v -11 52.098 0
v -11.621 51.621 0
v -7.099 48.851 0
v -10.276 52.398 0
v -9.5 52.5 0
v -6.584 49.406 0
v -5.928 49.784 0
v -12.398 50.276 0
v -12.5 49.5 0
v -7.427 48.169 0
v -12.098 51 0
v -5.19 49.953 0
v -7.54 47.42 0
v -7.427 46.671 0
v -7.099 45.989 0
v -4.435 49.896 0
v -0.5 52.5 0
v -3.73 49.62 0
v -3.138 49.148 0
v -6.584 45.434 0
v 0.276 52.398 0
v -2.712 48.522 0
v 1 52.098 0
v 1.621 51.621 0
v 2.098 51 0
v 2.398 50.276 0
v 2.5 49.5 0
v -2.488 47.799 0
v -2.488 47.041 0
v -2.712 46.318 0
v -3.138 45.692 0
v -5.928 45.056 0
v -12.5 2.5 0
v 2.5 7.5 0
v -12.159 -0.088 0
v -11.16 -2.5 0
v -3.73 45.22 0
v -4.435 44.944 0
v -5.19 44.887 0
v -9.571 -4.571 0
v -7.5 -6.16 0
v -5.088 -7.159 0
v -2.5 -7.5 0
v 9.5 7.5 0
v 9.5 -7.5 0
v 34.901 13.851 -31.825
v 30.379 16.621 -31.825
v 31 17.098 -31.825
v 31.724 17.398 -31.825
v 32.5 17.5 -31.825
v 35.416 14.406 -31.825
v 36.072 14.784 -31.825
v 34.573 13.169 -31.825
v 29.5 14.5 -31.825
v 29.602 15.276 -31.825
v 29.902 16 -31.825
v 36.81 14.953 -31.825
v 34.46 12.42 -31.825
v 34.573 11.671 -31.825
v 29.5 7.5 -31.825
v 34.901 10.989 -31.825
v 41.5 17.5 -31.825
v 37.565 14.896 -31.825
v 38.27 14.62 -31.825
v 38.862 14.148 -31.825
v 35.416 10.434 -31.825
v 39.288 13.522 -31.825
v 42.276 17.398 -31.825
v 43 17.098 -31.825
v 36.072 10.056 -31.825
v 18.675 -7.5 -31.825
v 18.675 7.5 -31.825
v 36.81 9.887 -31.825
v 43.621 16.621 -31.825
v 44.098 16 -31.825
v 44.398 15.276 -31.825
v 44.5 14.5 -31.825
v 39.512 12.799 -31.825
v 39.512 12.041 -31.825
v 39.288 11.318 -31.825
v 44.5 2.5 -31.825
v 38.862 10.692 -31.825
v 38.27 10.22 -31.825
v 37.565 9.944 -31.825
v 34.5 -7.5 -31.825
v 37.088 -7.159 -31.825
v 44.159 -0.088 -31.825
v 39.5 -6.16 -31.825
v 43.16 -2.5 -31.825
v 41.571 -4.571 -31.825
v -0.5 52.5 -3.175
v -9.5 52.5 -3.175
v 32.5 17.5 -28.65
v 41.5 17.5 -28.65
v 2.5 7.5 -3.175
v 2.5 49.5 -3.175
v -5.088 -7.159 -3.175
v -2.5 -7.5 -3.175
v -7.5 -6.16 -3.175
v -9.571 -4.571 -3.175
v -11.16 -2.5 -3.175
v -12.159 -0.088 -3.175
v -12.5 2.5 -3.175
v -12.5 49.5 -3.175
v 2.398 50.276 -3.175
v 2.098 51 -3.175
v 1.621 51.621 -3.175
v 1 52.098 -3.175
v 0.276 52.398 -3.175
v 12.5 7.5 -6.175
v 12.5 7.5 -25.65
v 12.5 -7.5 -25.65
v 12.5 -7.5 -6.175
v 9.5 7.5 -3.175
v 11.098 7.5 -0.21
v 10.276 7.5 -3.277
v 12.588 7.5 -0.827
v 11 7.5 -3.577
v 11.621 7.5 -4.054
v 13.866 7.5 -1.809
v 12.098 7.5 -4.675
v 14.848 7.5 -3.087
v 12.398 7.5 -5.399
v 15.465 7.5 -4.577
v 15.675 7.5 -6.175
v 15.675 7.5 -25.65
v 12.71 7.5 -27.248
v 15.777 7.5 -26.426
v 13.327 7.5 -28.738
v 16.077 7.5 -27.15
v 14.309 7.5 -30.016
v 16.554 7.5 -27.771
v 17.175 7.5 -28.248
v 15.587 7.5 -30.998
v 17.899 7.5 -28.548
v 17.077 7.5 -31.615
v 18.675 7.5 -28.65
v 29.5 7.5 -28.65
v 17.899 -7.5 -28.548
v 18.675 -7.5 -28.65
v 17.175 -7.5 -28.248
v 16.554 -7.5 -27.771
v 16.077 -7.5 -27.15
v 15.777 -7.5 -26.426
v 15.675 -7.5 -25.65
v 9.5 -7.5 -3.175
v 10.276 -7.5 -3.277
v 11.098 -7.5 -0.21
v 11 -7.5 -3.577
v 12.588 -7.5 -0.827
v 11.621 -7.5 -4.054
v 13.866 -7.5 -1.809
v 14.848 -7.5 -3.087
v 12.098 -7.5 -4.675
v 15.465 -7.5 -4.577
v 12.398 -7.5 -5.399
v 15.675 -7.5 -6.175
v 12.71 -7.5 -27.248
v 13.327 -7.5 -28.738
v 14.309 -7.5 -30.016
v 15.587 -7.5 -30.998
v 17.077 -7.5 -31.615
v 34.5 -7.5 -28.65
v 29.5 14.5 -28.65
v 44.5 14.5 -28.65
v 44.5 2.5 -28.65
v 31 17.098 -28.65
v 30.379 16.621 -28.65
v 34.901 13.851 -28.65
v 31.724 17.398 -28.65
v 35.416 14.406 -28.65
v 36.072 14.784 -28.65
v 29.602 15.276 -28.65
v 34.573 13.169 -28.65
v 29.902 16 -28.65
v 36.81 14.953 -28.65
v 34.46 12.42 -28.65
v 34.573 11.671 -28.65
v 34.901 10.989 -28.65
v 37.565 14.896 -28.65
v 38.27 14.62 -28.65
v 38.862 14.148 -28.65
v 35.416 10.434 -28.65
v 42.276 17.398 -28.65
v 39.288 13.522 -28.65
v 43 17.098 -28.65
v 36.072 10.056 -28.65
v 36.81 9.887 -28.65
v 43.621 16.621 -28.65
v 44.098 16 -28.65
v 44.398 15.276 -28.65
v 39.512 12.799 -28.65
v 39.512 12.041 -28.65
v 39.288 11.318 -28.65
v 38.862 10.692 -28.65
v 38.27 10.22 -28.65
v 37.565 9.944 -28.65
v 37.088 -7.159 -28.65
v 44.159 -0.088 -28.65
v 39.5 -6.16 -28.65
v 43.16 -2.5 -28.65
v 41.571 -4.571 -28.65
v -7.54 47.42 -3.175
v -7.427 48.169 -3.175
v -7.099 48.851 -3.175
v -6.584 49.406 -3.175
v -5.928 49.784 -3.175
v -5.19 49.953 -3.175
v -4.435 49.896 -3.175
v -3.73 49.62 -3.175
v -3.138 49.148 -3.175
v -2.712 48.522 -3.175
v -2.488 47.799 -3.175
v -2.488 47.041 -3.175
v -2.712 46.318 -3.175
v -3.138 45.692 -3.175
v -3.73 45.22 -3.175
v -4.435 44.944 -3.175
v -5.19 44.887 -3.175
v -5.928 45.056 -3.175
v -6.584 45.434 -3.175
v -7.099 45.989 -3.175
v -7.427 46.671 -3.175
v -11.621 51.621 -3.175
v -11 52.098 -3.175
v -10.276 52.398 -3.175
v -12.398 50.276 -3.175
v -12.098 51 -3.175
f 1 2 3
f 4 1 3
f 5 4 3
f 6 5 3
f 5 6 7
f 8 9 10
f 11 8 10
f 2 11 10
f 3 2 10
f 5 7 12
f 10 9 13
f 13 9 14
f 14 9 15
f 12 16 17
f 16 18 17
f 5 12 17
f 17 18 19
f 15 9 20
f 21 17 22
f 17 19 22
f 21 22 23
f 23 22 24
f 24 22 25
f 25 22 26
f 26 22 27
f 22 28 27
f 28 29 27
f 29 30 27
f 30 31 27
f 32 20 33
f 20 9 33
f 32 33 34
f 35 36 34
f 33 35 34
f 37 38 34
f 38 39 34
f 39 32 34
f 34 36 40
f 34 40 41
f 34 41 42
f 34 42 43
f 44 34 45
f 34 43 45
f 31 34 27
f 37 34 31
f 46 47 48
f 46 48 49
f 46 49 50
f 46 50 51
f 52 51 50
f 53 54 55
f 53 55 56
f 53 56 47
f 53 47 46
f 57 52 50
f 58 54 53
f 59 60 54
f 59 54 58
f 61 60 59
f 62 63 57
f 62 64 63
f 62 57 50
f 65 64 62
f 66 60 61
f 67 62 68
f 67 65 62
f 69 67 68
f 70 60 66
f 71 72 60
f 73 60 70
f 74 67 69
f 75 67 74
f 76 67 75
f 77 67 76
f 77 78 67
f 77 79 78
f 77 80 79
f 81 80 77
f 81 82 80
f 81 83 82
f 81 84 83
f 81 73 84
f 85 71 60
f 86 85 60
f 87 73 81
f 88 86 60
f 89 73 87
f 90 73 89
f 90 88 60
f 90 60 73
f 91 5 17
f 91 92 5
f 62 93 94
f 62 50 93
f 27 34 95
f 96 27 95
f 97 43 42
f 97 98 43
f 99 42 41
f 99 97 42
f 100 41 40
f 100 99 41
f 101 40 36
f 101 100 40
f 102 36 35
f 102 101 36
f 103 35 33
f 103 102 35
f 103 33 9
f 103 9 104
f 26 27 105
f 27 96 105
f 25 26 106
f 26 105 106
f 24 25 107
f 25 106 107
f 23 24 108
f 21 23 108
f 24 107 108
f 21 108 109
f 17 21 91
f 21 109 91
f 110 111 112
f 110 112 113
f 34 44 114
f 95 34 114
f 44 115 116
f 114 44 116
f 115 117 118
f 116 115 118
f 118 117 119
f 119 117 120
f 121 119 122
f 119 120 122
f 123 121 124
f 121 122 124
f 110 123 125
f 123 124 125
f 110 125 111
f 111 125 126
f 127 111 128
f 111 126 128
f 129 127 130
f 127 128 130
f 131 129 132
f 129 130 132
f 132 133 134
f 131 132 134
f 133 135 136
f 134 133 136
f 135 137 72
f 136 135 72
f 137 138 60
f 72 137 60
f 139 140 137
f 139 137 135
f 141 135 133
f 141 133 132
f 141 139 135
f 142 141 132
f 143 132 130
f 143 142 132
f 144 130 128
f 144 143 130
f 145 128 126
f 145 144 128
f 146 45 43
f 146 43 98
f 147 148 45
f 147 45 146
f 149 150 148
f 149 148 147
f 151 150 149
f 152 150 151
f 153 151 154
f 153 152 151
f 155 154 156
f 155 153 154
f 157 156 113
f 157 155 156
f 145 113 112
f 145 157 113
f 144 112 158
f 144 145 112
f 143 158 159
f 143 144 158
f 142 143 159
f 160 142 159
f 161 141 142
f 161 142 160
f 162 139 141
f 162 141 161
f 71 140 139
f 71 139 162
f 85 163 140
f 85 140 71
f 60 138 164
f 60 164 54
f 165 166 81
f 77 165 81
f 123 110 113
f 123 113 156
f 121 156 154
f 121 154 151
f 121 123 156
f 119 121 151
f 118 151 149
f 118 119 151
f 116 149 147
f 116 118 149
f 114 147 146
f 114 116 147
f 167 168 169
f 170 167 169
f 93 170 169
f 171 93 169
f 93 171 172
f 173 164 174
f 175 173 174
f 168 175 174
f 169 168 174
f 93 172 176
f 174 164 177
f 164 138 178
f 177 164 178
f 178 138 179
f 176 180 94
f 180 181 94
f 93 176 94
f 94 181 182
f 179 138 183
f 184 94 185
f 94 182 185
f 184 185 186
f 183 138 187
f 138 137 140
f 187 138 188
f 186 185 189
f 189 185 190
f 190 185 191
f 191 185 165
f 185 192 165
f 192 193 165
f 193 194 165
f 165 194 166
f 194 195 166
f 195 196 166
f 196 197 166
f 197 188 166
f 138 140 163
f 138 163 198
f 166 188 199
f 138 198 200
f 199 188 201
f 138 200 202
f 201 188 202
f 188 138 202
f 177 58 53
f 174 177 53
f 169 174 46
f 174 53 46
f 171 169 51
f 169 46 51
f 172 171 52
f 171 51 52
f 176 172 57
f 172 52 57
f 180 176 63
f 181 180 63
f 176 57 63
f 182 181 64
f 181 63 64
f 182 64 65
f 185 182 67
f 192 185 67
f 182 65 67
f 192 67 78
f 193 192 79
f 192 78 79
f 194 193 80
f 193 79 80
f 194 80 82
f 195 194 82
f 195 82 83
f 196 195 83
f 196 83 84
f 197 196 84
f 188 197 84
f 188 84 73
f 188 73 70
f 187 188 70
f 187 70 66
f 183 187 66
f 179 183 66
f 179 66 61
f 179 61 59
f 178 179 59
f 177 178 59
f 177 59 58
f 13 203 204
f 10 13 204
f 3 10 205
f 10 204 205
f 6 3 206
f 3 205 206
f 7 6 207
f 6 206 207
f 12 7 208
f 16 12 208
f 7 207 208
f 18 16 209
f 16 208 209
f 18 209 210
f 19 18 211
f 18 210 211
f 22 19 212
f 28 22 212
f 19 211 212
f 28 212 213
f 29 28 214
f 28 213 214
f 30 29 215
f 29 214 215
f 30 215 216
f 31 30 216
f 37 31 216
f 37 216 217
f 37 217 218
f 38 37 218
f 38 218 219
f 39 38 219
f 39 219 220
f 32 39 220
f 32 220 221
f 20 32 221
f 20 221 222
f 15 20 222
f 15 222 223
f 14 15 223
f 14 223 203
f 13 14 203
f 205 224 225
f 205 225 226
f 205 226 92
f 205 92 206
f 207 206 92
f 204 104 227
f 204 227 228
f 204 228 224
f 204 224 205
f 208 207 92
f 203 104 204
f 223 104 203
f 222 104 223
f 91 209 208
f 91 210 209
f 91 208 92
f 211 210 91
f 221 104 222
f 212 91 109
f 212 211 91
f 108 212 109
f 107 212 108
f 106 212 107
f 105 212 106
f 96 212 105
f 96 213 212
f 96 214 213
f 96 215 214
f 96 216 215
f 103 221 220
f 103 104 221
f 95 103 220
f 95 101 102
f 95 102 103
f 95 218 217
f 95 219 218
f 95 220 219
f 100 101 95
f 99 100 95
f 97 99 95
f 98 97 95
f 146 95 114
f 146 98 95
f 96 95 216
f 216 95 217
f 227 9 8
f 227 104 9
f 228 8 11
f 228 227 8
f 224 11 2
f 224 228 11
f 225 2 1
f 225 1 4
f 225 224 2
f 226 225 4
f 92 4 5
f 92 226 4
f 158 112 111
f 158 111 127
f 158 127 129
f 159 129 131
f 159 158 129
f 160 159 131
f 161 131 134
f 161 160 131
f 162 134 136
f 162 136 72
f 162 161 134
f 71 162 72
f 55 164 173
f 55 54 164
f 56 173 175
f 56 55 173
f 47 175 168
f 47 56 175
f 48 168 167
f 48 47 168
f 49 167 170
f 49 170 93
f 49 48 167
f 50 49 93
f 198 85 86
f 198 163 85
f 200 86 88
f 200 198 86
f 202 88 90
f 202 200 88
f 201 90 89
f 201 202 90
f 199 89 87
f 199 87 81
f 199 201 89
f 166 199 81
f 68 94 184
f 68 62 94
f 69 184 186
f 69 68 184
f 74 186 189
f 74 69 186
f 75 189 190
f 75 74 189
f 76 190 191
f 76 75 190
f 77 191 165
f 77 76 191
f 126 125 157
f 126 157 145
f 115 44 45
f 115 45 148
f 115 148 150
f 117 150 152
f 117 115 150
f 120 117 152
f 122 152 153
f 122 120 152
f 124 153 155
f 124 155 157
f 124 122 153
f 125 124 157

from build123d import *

# Parameters (mm, degrees)
SKETCH1_W                    = 25
SKETCH1_H                    = 15
BASE_FLANGE1_DEPTH           = 3.175
EDGE_FLANGE1_STRIP_W         = 18.7
EDGE_FLANGE1_STRIP_H         = 3.175
EDGE_FLANGE1_STRIP_CUT_DEPTH = 15
EDGE_FLANGE1_DEPTH           = 15
EDGE_FLANGE2_STRIP_W         = 18.7
EDGE_FLANGE2_STRIP_H         = 3.175
EDGE_FLANGE2_STRIP_CUT_DEPTH = 15
EDGE_FLANGE2_DEPTH           = 15
SKETCH12_W                   = 15
SKETCH12_H                   = 3.175
BOSS_EXTRUDE1_DEPTH          = 45
SKETCH15_R                   = 2.54
CUT_EXTRUDE2_DEPTH           = 75.547451331
SKETCH19_W                   = 15
SKETCH19_H                   = 3.175
BOSS_EXTRUDE2_DEPTH          = 10
SKETCH21_R                   = 2.54
CUT_EXTRUDE3_DEPTH           = 76.824340584
FILLET2_R                    = 3
FILLET3_R                    = 10


# Sheet-metal steps are written as plain solids
with BuildPart() as part:
    # Sketch1 → Base-Flange1 (new body)
    with BuildSketch(Plane.XY):
        Rectangle(SKETCH1_W, SKETCH1_H)
    extrude(amount=-BASE_FLANGE1_DEPTH)

    # Edge-Flange1 strip (across the edge) → Edge-Flange1 strip cut (cut)
    with BuildSketch(Plane(origin=(12.5, 7.5, -3.175), x_dir=(-1, 0, 0), z_dir=(0, -1, 0))):
        with Locations((-6.35, -1.5875)):
            Rectangle(EDGE_FLANGE1_STRIP_W, EDGE_FLANGE1_STRIP_H)
    extrude(amount=EDGE_FLANGE1_STRIP_CUT_DEPTH, mode=Mode.SUBTRACT)

    # Edge-Flange1 section (across the edge) → Edge-Flange1 (add)
    with BuildSketch(Plane(origin=(12.5, 7.5, -3.175), x_dir=(-1, 0, 0), z_dir=(0, -1, 0))):
        with BuildLine():
            Line((-3.175, 3), (-3.175, 25.475))
            Line((-3.175, 25.475), (0, 25.475))
            Line((0, 25.475), (0, 3))
            ThreePointArc((0, 3), (0.878679656, 0.878679656), (3, 0))
            Line((3, 0), (3, -3.175))
            ThreePointArc((3, -3.175), (-1.366384374, -1.366384374), (-3.175, 3))
        make_face()
    extrude(amount=EDGE_FLANGE1_DEPTH)

    # Edge-Flange2 strip (across the edge) → Edge-Flange2 strip cut (cut)
    with BuildSketch(Plane(origin=(15.675, -7.5, -28.65), x_dir=(0, 0, 1), z_dir=(0, 1, 0))):
        with Locations((-6.35, -1.5875)):
            Rectangle(EDGE_FLANGE2_STRIP_W, EDGE_FLANGE2_STRIP_H)
    extrude(amount=EDGE_FLANGE2_STRIP_CUT_DEPTH, mode=Mode.SUBTRACT)

    # Edge-Flange2 section (across the edge) → Edge-Flange2 (add)
    with BuildSketch(Plane(origin=(15.675, -7.5, -28.65), x_dir=(0, 0, 1), z_dir=(0, 1, 0))):
        with BuildLine():
            Line((-3.175, 3), (-3.175, 28.825))
            Line((-3.175, 28.825), (0, 28.825))
            Line((0, 28.825), (0, 3))
            ThreePointArc((0, 3), (0.878679656, 0.878679656), (3, 0))
            Line((3, 0), (3, -3.175))
            ThreePointArc((3, -3.175), (-1.366384374, -1.366384374), (-3.175, 3))
        make_face()
    extrude(amount=EDGE_FLANGE2_DEPTH)

    # Sketch12 → Boss-Extrude1 (add)
    with BuildSketch(Plane(origin=(0, 7.5, 0), x_dir=(1, 0, 0), z_dir=(0, 1, 0))):
        with Locations((-5, 1.5875)):
            Rectangle(SKETCH12_W, SKETCH12_H)
    extrude(amount=BOSS_EXTRUDE1_DEPTH)

    # Sketch15 → Cut-Extrude2 (cut, through all)
    with BuildSketch(Plane(origin=(0, 0, -3.175), x_dir=(-1, 0, 0), z_dir=(0, 0, -1))):
        with Locations((5, 47.42)):
            Circle(SKETCH15_R)
    extrude(amount=-CUT_EXTRUDE2_DEPTH, mode=Mode.SUBTRACT)

    # Sketch19 → Boss-Extrude2 (add)
    with BuildSketch(Plane(origin=(0, 7.5, 0), x_dir=(1, 0, 0), z_dir=(0, 1, 0))):
        with Locations((37, 30.2375)):
            Rectangle(SKETCH19_W, SKETCH19_H)
    extrude(amount=BOSS_EXTRUDE2_DEPTH)

    # Sketch21 → Cut-Extrude3 (cut, through all)
    with BuildSketch(Plane(origin=(0, 0, -31.825), x_dir=(-1, 0, 0), z_dir=(0, 0, -1))):
        with Locations((-37, 12.42)):
            Circle(SKETCH21_R)
    extrude(amount=-CUT_EXTRUDE3_DEPTH, mode=Mode.SUBTRACT)

    # Fillet2
    fillet2_edges = [part.edges().sort_by_distance(p)[0] for p in [
        (44.5, 17.5, -30.2375),
        (29.5, 17.5, -30.2375),
        (-12.5, 52.5, -1.5875),
        (2.5, 52.5, -1.5875),
    ]]
    fillet(fillet2_edges, radius=FILLET2_R)

    # Fillet3
    fillet3_edges = [part.edges().sort_by_distance(p)[0] for p in [
        (44.5, -7.5, -30.2375),
        (-12.5, -7.5, -1.5875),
    ]]
    fillet(fillet3_edges, radius=FILLET3_R)


solid = part.part
